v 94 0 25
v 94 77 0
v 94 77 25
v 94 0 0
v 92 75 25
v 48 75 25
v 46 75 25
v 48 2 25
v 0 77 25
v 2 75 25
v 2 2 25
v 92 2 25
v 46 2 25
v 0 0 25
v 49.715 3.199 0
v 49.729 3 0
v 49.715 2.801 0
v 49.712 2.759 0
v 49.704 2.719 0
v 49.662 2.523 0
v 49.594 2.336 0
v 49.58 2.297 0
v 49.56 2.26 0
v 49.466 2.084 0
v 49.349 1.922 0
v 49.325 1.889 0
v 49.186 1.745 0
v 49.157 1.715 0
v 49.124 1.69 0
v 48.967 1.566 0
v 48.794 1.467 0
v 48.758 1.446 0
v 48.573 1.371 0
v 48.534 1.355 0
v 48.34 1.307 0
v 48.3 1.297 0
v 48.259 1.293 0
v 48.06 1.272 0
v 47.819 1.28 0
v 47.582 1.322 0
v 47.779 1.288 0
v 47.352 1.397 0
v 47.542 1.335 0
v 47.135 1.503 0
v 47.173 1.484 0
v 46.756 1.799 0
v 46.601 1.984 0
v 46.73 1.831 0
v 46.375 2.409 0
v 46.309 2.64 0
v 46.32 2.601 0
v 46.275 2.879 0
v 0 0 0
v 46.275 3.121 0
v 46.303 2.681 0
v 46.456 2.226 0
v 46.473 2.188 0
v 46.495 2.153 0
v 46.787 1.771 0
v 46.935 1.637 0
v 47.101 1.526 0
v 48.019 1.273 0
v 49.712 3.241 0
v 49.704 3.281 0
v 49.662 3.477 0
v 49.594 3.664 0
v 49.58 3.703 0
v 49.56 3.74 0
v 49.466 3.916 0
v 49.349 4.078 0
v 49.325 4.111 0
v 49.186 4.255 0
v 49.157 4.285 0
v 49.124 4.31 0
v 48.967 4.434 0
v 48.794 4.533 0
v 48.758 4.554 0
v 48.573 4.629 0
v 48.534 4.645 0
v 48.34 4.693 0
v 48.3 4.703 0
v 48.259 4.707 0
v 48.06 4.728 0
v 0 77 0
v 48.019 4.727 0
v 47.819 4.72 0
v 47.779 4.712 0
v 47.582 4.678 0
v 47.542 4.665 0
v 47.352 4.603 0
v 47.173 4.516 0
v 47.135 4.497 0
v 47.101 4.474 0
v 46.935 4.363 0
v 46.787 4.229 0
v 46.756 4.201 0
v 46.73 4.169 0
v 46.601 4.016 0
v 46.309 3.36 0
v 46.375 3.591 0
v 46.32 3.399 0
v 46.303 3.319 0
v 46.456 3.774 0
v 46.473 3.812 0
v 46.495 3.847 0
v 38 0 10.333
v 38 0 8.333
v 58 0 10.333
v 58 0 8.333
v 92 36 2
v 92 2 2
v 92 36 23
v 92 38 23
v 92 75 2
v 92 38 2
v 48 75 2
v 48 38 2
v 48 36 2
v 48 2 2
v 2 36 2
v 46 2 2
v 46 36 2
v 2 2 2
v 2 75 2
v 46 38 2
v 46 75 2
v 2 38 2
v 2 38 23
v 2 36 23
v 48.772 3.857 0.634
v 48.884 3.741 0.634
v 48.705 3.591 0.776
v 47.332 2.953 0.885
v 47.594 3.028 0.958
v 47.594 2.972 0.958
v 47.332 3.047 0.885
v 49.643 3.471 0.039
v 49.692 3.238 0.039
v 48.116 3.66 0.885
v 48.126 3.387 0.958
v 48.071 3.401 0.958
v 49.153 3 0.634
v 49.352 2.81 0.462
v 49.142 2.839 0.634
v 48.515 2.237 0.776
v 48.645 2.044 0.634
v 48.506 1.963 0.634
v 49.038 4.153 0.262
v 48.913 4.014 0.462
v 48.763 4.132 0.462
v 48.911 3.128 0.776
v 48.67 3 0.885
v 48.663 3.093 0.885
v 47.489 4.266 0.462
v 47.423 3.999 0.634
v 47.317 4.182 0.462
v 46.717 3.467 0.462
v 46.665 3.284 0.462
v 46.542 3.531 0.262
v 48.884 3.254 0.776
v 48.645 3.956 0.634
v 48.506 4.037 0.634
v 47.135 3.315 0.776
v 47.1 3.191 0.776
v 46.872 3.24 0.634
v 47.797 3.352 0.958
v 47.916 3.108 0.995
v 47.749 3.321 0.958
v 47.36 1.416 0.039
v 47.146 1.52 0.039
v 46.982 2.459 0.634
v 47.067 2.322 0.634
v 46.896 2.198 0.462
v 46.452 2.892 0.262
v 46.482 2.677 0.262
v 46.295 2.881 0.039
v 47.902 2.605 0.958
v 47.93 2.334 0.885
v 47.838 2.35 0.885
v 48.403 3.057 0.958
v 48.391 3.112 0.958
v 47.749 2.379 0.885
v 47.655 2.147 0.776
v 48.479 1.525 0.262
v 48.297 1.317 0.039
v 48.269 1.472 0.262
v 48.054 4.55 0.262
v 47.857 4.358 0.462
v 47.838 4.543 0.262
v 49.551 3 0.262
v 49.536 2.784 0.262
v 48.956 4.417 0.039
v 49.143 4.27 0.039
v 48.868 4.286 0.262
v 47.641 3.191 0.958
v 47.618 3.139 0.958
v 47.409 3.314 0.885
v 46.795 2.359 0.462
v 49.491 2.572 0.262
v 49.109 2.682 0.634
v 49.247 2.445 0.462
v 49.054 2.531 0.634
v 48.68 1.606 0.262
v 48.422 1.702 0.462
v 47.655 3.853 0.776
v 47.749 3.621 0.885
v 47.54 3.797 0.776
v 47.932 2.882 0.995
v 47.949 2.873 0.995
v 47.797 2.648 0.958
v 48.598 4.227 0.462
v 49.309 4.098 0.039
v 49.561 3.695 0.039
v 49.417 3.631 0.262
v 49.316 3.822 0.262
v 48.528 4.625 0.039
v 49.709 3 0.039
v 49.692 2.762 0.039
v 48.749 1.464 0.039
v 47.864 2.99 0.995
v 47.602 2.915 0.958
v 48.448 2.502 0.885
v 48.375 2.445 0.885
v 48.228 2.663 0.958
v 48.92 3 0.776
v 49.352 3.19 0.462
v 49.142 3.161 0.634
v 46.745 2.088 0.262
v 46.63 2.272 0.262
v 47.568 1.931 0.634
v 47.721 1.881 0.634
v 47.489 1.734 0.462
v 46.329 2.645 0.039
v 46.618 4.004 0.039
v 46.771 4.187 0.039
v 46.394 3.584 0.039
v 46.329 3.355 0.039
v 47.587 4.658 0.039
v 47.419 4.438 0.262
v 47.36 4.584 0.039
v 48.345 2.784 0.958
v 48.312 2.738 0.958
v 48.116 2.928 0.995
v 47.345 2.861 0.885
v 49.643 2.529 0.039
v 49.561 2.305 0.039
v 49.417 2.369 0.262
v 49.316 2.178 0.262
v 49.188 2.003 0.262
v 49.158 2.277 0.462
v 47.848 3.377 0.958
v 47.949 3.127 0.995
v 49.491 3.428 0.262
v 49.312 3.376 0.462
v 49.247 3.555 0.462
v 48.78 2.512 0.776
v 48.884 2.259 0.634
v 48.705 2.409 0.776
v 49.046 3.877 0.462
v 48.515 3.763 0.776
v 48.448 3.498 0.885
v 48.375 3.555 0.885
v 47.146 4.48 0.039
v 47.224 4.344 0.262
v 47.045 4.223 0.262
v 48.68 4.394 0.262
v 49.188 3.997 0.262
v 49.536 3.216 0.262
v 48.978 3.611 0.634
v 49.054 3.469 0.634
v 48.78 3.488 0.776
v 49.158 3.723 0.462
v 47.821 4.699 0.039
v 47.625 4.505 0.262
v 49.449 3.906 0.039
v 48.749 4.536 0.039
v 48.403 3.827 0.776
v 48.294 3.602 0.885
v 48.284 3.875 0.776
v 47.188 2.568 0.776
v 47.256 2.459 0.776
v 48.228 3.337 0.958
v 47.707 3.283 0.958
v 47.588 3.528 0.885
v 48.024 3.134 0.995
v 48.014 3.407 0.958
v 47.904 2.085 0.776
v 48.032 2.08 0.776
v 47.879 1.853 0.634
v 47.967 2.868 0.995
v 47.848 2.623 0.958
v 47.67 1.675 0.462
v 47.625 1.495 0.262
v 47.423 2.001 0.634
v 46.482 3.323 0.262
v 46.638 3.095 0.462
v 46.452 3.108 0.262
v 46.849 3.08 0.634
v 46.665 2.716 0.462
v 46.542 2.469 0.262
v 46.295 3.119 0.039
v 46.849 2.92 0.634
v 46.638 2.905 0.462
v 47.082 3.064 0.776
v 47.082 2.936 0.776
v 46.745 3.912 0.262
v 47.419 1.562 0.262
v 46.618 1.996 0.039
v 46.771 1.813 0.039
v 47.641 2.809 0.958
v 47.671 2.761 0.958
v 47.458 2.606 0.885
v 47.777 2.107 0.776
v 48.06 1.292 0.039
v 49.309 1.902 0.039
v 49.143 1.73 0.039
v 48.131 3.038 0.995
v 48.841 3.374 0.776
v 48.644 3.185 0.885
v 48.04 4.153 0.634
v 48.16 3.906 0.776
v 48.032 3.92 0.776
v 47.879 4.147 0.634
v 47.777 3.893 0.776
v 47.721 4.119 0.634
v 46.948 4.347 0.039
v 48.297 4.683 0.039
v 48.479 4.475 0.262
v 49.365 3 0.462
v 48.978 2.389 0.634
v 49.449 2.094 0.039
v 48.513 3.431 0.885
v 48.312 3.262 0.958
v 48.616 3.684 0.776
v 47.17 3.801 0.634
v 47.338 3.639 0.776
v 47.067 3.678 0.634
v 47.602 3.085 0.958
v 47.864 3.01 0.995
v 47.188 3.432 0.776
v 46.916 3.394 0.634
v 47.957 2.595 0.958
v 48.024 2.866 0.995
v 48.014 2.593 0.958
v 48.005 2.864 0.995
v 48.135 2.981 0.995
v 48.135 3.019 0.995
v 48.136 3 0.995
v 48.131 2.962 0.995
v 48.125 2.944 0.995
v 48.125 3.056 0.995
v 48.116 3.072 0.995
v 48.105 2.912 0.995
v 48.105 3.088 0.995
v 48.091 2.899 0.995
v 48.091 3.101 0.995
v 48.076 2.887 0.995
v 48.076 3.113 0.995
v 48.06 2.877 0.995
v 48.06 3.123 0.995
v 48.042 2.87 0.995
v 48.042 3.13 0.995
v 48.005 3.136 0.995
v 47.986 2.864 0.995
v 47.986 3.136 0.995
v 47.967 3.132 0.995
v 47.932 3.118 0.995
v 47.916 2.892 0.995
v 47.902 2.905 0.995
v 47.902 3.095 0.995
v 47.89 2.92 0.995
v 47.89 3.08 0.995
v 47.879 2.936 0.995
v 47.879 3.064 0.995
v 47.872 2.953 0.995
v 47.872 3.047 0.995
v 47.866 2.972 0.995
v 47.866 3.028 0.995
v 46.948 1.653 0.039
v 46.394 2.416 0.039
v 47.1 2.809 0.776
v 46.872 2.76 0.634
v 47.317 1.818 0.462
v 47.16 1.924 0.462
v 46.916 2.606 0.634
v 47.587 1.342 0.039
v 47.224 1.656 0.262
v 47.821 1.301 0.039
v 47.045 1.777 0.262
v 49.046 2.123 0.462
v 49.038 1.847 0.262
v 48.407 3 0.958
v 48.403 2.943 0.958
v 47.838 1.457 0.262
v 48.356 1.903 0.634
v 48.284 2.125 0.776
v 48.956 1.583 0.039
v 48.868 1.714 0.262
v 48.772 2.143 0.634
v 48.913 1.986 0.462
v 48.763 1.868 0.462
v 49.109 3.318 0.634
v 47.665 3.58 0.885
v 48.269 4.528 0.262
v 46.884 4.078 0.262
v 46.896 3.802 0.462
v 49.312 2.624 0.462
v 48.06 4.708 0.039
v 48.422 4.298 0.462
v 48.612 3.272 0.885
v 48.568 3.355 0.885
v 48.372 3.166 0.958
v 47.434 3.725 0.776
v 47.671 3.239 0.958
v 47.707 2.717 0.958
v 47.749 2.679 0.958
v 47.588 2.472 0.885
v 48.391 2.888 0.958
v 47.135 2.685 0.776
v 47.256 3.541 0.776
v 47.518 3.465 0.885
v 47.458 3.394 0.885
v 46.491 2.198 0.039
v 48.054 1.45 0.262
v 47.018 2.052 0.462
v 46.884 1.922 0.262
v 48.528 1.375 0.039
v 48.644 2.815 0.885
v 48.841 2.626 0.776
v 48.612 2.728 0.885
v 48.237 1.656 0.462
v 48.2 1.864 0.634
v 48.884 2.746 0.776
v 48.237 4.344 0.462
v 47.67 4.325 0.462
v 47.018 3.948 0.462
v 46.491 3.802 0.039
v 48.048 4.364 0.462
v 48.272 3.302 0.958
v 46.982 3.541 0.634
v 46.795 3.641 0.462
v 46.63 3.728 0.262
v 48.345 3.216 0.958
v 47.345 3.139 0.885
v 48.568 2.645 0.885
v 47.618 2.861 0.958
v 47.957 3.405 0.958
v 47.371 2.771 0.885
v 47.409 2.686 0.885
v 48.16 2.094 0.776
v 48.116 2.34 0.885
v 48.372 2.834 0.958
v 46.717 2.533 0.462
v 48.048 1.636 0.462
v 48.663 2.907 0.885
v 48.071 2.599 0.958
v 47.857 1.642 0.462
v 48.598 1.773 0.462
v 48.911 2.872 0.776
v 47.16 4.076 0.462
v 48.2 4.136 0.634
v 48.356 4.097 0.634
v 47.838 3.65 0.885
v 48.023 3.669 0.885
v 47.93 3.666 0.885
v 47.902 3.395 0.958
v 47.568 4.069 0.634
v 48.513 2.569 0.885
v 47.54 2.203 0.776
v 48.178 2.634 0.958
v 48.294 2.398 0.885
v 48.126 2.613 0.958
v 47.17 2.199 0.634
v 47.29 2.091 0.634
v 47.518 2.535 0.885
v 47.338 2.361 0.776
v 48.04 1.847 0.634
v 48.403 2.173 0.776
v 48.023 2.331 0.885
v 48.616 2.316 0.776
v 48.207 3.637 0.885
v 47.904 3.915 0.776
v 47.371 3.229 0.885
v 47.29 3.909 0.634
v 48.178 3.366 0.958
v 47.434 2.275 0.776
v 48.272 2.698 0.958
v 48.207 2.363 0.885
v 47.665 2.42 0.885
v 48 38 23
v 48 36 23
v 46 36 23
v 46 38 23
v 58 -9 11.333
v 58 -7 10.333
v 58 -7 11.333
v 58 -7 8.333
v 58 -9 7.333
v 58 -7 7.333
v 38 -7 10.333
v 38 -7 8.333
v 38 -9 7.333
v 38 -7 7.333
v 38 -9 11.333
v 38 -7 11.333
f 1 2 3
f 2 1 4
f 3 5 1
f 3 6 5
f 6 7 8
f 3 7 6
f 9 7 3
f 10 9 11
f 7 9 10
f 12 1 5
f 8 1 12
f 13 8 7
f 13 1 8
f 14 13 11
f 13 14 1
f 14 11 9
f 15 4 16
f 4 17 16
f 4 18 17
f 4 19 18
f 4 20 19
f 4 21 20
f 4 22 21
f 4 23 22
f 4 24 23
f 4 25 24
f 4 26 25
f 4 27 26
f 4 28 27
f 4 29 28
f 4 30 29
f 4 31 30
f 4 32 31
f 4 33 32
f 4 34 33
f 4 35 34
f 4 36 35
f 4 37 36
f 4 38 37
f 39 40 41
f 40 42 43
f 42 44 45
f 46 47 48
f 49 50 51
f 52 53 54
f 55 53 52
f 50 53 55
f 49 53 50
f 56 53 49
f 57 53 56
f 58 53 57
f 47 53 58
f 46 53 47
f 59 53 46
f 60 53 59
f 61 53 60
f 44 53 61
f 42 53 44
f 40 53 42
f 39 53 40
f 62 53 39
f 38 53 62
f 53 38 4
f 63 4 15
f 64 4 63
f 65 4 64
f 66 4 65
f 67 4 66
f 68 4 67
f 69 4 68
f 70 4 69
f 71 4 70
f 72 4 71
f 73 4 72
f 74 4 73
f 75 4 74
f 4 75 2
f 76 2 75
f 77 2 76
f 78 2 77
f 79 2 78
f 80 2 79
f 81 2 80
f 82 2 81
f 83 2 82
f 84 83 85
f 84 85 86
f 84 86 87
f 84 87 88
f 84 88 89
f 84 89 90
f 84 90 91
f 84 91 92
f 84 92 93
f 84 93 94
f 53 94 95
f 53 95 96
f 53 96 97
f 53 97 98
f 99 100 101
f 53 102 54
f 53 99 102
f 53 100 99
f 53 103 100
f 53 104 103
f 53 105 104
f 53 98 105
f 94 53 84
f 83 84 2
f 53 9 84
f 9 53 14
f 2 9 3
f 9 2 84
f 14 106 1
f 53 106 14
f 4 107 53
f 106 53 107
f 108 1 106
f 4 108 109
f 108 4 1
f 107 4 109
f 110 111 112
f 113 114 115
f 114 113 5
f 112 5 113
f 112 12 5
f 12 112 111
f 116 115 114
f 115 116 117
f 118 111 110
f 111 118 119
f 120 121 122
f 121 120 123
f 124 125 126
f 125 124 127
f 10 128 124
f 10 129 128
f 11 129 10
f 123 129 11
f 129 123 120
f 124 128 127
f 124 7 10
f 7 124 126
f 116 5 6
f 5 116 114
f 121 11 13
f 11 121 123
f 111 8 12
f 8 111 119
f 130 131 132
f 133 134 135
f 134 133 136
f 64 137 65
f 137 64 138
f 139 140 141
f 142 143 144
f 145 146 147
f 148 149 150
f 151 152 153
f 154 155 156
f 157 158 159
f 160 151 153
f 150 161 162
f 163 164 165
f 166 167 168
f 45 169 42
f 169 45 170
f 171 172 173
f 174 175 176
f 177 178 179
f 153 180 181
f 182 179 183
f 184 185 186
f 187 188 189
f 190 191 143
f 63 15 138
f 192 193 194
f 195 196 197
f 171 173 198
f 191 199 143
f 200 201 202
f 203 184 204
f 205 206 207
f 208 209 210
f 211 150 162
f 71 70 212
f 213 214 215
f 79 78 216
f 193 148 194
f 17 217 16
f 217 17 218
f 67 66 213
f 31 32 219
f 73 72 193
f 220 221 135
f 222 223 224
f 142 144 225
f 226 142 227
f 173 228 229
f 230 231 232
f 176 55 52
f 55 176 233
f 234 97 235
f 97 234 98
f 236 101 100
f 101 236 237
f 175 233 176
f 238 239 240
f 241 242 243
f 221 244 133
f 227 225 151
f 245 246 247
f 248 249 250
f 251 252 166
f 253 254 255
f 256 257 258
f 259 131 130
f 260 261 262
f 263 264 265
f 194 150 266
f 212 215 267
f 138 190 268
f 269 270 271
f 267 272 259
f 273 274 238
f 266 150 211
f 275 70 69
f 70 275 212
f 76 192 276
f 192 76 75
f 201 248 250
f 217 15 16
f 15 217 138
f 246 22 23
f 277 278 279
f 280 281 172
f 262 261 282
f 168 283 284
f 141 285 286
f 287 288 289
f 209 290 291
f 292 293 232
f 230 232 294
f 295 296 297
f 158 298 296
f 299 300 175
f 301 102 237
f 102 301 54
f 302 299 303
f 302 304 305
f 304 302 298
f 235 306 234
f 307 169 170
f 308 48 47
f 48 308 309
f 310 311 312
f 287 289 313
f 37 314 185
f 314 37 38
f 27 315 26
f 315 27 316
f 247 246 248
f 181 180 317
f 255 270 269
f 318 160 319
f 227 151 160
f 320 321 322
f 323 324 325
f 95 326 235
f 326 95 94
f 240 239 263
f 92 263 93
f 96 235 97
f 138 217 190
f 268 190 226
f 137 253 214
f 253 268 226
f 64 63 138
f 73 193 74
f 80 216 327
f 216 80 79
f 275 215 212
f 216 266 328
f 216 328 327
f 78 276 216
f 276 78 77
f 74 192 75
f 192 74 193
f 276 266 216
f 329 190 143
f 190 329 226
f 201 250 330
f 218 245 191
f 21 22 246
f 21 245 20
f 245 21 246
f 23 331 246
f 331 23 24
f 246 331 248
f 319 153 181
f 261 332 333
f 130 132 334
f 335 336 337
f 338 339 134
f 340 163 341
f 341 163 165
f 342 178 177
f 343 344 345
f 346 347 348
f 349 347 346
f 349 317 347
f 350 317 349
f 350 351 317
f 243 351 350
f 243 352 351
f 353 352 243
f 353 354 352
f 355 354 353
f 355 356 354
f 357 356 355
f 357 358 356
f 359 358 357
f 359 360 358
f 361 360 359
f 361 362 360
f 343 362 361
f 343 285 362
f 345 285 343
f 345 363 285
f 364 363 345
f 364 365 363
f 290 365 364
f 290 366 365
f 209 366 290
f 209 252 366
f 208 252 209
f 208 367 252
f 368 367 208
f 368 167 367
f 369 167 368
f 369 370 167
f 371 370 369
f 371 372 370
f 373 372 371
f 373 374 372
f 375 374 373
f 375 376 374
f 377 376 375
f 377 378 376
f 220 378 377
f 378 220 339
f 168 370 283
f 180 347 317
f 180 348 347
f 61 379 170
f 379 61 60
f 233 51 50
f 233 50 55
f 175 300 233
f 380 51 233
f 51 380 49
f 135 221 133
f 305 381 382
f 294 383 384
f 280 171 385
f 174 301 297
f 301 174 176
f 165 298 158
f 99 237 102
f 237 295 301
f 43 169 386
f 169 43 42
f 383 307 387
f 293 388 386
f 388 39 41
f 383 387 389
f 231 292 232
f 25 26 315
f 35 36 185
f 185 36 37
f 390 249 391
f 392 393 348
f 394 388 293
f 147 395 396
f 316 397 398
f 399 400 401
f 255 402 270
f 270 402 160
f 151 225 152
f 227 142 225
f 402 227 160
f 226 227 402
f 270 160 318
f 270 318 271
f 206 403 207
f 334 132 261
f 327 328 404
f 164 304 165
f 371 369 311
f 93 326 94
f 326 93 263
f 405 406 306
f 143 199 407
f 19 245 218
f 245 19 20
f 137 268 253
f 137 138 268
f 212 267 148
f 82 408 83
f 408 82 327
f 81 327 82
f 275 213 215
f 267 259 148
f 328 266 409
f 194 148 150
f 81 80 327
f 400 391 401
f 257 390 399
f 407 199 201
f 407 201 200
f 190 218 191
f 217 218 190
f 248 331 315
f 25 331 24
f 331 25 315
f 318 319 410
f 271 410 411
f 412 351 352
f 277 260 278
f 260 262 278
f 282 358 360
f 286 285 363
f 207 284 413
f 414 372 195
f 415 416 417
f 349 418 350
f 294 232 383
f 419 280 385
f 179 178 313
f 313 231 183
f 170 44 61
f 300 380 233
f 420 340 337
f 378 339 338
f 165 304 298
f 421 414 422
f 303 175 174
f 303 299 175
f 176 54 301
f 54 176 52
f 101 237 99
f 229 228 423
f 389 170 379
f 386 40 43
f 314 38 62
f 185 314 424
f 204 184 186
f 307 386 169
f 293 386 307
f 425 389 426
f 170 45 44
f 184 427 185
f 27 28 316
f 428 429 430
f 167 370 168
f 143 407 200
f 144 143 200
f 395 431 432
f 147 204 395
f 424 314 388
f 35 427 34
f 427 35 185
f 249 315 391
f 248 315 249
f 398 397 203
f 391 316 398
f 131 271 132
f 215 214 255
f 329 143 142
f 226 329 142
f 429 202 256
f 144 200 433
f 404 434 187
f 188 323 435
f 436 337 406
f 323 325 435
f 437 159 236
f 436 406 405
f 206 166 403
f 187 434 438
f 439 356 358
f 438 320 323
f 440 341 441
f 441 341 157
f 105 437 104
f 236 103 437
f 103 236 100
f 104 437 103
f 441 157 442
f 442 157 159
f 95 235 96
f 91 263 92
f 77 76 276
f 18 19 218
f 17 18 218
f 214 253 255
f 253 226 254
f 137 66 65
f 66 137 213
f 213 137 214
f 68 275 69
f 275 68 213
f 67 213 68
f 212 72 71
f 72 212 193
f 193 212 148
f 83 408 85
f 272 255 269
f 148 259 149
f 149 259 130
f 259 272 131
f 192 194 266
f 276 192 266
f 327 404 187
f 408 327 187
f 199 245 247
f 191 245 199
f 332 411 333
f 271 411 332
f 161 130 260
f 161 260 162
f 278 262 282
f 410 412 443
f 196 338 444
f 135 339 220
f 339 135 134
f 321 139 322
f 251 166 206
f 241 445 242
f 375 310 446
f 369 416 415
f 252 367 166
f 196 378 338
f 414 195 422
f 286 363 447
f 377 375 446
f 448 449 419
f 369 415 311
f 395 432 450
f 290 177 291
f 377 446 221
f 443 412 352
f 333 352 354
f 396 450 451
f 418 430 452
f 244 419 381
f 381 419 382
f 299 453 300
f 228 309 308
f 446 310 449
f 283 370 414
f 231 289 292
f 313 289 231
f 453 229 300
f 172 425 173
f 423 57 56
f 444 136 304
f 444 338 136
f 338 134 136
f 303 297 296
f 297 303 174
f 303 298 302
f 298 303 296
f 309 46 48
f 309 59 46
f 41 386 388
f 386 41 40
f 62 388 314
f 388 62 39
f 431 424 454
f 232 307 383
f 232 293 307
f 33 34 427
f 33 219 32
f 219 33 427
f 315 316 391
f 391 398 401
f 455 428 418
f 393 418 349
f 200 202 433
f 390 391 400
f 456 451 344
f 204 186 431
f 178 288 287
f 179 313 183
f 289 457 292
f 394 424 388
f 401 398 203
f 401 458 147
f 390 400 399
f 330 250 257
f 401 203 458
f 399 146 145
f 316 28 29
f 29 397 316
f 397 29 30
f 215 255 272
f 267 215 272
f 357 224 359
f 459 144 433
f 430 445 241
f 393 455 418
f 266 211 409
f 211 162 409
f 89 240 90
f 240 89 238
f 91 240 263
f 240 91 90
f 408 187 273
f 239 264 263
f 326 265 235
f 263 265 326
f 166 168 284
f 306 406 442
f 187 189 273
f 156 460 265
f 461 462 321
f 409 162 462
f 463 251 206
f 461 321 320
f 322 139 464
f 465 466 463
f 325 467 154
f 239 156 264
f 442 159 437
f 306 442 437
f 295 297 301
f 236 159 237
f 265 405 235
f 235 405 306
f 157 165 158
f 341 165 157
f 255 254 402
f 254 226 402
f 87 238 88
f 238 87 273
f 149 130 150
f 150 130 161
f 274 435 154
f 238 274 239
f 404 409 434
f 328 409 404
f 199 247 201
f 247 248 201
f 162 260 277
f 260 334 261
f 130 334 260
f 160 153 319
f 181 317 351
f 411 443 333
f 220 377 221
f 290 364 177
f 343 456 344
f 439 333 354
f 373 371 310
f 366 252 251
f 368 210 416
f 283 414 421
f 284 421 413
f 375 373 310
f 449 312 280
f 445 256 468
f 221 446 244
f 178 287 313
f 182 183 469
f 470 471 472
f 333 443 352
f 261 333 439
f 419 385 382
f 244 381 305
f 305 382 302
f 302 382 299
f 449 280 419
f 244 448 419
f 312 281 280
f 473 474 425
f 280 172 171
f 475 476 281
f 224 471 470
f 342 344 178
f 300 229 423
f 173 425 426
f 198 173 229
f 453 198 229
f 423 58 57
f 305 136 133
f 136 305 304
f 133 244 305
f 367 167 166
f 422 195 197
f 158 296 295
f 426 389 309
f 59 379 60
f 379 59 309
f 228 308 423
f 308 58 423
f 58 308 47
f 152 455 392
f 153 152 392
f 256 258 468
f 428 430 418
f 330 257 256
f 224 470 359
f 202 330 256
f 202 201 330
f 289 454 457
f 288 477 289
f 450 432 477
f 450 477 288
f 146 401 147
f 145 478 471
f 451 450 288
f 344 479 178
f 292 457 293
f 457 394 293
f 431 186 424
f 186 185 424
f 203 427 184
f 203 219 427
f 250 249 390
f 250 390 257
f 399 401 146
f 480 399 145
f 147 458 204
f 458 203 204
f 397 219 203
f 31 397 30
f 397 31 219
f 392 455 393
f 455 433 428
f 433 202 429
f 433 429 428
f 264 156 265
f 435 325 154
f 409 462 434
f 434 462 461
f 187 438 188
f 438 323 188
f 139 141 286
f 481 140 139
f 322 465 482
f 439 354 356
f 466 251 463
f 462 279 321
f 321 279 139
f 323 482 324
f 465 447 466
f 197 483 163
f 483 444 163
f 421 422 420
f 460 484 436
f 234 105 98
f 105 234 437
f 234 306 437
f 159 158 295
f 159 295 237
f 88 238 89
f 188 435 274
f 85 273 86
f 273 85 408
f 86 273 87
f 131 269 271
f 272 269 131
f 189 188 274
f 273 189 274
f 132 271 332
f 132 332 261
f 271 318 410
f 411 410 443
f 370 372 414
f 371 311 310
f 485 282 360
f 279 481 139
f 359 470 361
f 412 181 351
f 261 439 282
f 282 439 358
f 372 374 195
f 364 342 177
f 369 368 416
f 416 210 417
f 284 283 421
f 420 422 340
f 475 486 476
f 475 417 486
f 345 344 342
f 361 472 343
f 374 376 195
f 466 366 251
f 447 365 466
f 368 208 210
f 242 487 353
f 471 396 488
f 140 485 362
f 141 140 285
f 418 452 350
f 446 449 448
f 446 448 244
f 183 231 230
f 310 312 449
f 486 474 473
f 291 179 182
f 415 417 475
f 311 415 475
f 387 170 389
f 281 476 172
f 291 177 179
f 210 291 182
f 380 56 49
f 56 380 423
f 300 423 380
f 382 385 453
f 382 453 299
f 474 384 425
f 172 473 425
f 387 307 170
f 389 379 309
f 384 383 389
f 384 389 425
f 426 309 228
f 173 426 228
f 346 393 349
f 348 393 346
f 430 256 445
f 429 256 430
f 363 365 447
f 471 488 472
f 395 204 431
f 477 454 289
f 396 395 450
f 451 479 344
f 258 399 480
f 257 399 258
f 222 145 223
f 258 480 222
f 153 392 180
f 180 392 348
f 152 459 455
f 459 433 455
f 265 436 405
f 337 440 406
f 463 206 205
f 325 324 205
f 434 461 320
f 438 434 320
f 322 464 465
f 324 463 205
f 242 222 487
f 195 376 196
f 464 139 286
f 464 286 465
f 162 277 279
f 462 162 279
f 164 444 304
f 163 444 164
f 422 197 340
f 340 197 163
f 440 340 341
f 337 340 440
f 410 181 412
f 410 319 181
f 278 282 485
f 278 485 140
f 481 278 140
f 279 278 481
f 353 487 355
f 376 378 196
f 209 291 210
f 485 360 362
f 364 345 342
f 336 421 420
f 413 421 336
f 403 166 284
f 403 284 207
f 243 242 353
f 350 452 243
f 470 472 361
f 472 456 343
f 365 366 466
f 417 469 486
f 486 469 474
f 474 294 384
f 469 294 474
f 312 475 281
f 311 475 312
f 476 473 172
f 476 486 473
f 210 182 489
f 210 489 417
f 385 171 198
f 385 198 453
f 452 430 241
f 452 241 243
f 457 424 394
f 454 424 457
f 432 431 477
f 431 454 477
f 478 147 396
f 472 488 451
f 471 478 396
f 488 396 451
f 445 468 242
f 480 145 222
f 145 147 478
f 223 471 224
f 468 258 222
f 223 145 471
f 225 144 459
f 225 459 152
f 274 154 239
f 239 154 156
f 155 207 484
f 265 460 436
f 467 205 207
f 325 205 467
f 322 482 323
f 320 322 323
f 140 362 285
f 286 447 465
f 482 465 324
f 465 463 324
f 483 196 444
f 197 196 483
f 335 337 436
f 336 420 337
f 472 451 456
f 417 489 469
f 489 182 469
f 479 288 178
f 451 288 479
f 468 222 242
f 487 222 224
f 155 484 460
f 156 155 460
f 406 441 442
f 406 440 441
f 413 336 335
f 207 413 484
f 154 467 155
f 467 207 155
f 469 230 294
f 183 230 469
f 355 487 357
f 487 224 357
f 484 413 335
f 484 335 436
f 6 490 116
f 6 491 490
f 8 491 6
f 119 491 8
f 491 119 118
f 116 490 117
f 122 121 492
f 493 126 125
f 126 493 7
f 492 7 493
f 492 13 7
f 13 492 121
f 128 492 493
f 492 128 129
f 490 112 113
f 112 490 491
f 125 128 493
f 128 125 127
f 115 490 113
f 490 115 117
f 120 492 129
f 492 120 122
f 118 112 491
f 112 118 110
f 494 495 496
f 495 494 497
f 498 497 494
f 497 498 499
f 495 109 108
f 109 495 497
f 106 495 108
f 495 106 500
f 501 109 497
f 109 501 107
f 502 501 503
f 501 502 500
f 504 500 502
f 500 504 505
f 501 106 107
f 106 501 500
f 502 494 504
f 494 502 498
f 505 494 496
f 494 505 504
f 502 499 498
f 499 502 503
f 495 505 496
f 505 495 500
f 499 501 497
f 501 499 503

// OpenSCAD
$fn = 45;

DRAWER_HEIGHT = 25;
CABINET_WIDTH = 100; // adjustable from ~30-200
CABINET_DEPTH = 80;  // adjustable from ~50-200

// drawer 5, 4 sectons
difference() {
    translate([0,0,0]) cube([CABINET_WIDTH - 6, CABINET_DEPTH - 3, DRAWER_HEIGHT]);
    translate([2,2,2]) cube([CABINET_WIDTH - 10, CABINET_DEPTH - 7, DRAWER_HEIGHT]); 
    translate([(CABINET_WIDTH / 2) - 2, 3, -1]) sphere(2);
}

// dividers
    difference() {
        translate([(CABINET_WIDTH / 2) - 4, 2,0]) cube([2, CABINET_DEPTH - 7, DRAWER_HEIGHT]);
        translate([(CABINET_WIDTH / 2) - 2, 3, -1]) sphere(2);
    }
    translate([0,CABINET_DEPTH / 2 - 4,0]) cube([CABINET_WIDTH - 7, 2,DRAWER_HEIGHT -2]);

// pull handle
translate([(CABINET_WIDTH / 2) - 12,-9,(DRAWER_HEIGHT / 3)]) cube([20, 10, 2]);
translate([(CABINET_WIDTH / 2) - 12,-9,(DRAWER_HEIGHT / 3) -1]) cube([20, 2, 4]);
